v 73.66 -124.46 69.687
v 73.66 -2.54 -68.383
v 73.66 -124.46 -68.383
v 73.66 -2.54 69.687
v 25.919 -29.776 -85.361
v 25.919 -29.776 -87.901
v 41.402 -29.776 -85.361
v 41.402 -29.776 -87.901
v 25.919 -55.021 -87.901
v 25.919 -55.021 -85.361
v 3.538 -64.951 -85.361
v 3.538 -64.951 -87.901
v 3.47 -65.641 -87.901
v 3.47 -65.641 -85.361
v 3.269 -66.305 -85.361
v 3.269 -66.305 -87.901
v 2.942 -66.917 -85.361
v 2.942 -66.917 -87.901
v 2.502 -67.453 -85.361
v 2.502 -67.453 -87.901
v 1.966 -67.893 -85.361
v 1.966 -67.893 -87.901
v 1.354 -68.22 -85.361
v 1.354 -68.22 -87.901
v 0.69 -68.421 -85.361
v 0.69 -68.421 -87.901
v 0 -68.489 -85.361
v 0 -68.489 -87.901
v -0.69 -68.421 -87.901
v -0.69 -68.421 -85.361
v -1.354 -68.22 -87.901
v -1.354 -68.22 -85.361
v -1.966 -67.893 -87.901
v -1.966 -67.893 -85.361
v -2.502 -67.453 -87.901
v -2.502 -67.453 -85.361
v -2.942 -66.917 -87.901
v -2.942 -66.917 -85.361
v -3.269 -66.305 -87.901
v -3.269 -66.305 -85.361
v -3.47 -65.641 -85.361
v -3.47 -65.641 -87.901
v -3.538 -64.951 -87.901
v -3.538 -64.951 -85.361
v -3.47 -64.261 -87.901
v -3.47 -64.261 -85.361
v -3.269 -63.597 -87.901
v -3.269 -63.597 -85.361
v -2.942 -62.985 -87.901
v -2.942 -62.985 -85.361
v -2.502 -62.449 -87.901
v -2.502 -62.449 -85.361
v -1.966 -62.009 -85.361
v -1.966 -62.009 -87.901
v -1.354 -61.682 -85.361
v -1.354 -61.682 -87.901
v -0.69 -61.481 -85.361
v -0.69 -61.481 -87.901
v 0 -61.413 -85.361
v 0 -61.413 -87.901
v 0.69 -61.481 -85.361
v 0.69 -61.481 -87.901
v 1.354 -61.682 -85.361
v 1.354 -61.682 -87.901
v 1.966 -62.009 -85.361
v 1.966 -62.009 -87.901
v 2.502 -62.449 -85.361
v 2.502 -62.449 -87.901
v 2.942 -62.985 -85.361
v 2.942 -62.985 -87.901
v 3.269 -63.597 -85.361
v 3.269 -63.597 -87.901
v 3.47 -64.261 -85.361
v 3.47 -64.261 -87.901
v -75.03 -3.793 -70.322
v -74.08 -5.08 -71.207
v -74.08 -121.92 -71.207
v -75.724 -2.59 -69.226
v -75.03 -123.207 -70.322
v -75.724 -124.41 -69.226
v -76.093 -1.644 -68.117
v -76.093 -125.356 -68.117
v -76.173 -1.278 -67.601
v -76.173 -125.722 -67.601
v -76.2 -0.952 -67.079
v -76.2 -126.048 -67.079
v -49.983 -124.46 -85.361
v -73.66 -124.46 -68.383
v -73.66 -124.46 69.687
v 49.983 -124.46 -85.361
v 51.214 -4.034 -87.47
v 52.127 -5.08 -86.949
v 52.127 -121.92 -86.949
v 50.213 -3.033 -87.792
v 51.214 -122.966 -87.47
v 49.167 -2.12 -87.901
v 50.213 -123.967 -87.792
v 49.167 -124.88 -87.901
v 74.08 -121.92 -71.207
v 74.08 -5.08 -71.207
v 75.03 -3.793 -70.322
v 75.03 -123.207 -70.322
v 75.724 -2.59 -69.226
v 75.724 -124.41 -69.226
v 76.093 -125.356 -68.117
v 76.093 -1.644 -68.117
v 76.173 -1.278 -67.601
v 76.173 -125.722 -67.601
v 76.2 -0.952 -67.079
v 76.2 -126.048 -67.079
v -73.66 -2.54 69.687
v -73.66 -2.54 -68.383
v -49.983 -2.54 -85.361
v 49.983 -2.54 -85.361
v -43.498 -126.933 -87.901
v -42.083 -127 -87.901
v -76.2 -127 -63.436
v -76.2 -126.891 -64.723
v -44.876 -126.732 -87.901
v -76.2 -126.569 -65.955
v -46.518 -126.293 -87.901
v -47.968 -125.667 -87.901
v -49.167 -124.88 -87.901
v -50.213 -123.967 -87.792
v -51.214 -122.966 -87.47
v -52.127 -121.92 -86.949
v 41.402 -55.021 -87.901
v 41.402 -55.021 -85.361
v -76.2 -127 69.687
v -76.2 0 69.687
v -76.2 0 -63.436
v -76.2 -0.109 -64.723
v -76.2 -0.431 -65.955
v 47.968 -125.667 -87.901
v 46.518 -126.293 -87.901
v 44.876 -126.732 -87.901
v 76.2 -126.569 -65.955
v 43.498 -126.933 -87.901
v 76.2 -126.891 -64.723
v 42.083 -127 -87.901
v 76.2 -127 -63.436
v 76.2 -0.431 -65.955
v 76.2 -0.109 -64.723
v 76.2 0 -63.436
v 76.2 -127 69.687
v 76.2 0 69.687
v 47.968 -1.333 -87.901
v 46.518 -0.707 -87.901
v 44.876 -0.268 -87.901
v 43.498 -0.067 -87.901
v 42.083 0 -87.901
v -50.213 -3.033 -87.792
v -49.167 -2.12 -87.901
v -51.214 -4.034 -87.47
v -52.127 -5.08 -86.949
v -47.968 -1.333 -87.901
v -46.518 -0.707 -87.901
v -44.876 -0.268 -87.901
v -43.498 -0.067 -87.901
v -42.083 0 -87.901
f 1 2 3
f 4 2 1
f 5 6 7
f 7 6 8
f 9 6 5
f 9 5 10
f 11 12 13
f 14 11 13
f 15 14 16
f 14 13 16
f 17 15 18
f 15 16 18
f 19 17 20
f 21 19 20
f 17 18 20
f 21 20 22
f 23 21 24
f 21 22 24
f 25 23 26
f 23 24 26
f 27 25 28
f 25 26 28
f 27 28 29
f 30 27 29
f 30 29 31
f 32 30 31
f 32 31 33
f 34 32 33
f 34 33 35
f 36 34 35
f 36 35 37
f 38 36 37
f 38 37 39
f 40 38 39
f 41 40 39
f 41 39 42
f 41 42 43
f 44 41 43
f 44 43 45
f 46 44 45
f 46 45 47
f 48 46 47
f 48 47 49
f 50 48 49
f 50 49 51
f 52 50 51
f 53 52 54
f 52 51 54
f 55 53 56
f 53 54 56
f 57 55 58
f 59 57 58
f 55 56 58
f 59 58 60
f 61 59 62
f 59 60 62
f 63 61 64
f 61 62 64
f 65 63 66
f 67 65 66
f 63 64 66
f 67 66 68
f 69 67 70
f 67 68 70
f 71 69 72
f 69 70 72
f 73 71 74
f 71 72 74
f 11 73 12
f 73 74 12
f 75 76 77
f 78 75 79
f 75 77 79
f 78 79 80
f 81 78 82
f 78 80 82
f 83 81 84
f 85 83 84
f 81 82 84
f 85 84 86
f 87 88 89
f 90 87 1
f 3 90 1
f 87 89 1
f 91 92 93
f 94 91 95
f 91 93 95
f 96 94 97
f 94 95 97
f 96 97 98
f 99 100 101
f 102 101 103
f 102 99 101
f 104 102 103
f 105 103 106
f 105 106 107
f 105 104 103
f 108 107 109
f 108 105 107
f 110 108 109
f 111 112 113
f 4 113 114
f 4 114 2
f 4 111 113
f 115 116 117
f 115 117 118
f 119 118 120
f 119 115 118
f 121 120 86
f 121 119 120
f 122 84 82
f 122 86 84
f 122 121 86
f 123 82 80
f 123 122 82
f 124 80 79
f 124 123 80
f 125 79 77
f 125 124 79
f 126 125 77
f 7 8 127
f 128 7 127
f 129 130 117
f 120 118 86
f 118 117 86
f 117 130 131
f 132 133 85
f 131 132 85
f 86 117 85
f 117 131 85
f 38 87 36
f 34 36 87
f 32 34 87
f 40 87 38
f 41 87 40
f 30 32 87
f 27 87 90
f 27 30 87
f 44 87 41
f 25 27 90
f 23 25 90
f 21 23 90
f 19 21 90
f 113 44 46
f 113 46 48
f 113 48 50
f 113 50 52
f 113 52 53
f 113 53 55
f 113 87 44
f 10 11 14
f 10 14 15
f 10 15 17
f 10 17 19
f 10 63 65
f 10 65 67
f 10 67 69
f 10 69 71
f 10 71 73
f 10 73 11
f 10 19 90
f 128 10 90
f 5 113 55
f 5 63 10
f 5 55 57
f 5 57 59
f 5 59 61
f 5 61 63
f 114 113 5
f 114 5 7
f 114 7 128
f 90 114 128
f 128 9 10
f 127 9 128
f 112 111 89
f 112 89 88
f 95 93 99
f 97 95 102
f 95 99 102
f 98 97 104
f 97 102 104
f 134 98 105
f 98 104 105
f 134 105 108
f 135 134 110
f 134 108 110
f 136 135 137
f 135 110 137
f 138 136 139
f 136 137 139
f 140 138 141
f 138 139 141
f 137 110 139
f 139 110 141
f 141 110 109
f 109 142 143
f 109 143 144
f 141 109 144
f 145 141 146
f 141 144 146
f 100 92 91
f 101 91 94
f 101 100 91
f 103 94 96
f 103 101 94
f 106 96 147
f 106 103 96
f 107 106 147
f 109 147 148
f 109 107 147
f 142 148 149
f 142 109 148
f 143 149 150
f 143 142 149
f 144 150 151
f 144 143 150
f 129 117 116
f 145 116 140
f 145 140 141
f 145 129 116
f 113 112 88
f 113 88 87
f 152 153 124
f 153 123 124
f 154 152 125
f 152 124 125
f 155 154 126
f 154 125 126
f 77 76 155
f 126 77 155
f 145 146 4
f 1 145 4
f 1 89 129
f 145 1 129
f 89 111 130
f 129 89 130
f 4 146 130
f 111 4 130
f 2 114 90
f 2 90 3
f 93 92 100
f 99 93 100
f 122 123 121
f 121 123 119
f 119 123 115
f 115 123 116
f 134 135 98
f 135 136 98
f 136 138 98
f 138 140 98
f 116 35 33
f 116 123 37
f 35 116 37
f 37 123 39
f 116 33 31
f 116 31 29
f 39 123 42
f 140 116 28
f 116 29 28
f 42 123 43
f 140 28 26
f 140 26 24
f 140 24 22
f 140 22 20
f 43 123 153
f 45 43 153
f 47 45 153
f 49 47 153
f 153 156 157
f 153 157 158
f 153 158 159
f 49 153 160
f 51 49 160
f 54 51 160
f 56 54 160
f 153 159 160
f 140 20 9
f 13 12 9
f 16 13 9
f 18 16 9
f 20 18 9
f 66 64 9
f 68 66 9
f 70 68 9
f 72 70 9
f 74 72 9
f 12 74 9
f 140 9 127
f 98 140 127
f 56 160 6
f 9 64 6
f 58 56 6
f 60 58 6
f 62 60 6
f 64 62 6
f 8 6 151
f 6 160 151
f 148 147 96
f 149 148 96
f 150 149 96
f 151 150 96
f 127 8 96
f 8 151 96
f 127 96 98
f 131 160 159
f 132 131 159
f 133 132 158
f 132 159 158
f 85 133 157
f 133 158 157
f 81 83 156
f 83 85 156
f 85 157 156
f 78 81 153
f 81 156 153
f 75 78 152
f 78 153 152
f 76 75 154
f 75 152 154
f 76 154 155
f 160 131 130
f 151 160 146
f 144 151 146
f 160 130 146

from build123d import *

# Parameters (mm, degrees)
F0_W     = 101.6
F0_H     = 18.2135990537
F1_DEPTH = 127
F2_DEPTH = 127
F3_T     = -2.54
F4_W     = 15.4837965965
F4_H     = 25.2453684807
F5_DEPTH = 25.4
F6_R     = 3.5383368109
F7_DEPTH = 25.4
F8_R     = 5.08
F9_R     = 5.08


with BuildPart() as f1:
    # F0 (on Front) → F1 (new body)
    with BuildSketch(Plane.XZ):
        with Locations((0, -60.580225858)):
            Rectangle(F0_W, F0_H)
        Polygon((-50.8, -69.6870253848), (-76.2, -69.6870253848), (-50.8, -87.9006244385), align=None)
        Polygon((-76.2, 69.6870253848), (-76.2, -69.6870253848), (-50.8, -69.6870253848), (-50.8, -51.4734263312), (50.8, -51.4734263312), (50.8, -69.6870253848), (76.2, -69.6870253848), (76.2, 69.6870253848), align=None)
        Polygon((76.2, -69.6870253848), (50.8, -69.6870253848), (50.8, -87.9006244385), align=None)
        with Locations((0, -78.7938249116)):
            Rectangle(F0_W, F0_H)
    extrude(amount=F1_DEPTH)

    # F0 (on Front) → F2 (join)
    with BuildSketch(Plane.XZ):
        Polygon((76.2, -69.6870253848), (50.8, -69.6870253848), (50.8, -87.9006244385), align=None)
        Polygon((-76.2, 69.6870253848), (-76.2, -69.6870253848), (-50.8, -69.6870253848), (-50.8, -51.4734263312), (50.8, -51.4734263312), (50.8, -69.6870253848), (76.2, -69.6870253848), (76.2, 69.6870253848), align=None)
        with Locations((0, -78.7938249116)):
            Rectangle(F0_W, F0_H)
        with Locations((0, -60.580225858)):
            Rectangle(F0_W, F0_H)
        Polygon((-50.8, -69.6870253848), (-76.2, -69.6870253848), (-50.8, -87.9006244385), align=None)
    extrude(amount=F2_DEPTH)

    # F3
    f3_openings = [f1.faces().sort_by_distance(p)[0] for p in [
        (0, -63.5, 69.687025),
    ]]
    offset(amount=F3_T, openings=f3_openings)

    # F4 (on face) → F5 (cut)
    with BuildSketch(Plane(origin=(0, 0, -87.9006244385), x_dir=(1, 0, 0), z_dir=(0, 0, -1))):
        with Locations((33.6605012417, 42.3985421658)):
            Rectangle(F4_W, F4_H)
    extrude(amount=-F5_DEPTH, mode=Mode.SUBTRACT)

    # F6 (on face) → F7 (cut)
    with BuildSketch(Plane(origin=(0, 0, -87.9006244385), x_dir=(1, 0, 0), z_dir=(0, 0, -1))):
        with Locations((0, 64.9510771036)):
            Circle(F6_R)
    extrude(amount=-F7_DEPTH, mode=Mode.SUBTRACT)

    # F8
    f8_edges = [f1.edges().sort_by_distance(p)[0] for p in [
        (50.8, -63.5, -87.900624),
        (76.2, -63.5, -69.687025),
        (63.5, 0, -78.793825),
        (63.5, -127, -78.793825),
    ]]
    fillet(f8_edges, radius=F8_R)

    # F9
    f9_edges = [f1.edges().sort_by_distance(p)[0] for p in [
        (-76.2, -63.5, -69.687025),
        (-50.8, -63.5, -87.900624),
        (-63.5, 0, -78.793825),
        (-63.5, -127, -78.793825),
    ]]
    fillet(f9_edges, radius=F9_R)


solid = f1.part
